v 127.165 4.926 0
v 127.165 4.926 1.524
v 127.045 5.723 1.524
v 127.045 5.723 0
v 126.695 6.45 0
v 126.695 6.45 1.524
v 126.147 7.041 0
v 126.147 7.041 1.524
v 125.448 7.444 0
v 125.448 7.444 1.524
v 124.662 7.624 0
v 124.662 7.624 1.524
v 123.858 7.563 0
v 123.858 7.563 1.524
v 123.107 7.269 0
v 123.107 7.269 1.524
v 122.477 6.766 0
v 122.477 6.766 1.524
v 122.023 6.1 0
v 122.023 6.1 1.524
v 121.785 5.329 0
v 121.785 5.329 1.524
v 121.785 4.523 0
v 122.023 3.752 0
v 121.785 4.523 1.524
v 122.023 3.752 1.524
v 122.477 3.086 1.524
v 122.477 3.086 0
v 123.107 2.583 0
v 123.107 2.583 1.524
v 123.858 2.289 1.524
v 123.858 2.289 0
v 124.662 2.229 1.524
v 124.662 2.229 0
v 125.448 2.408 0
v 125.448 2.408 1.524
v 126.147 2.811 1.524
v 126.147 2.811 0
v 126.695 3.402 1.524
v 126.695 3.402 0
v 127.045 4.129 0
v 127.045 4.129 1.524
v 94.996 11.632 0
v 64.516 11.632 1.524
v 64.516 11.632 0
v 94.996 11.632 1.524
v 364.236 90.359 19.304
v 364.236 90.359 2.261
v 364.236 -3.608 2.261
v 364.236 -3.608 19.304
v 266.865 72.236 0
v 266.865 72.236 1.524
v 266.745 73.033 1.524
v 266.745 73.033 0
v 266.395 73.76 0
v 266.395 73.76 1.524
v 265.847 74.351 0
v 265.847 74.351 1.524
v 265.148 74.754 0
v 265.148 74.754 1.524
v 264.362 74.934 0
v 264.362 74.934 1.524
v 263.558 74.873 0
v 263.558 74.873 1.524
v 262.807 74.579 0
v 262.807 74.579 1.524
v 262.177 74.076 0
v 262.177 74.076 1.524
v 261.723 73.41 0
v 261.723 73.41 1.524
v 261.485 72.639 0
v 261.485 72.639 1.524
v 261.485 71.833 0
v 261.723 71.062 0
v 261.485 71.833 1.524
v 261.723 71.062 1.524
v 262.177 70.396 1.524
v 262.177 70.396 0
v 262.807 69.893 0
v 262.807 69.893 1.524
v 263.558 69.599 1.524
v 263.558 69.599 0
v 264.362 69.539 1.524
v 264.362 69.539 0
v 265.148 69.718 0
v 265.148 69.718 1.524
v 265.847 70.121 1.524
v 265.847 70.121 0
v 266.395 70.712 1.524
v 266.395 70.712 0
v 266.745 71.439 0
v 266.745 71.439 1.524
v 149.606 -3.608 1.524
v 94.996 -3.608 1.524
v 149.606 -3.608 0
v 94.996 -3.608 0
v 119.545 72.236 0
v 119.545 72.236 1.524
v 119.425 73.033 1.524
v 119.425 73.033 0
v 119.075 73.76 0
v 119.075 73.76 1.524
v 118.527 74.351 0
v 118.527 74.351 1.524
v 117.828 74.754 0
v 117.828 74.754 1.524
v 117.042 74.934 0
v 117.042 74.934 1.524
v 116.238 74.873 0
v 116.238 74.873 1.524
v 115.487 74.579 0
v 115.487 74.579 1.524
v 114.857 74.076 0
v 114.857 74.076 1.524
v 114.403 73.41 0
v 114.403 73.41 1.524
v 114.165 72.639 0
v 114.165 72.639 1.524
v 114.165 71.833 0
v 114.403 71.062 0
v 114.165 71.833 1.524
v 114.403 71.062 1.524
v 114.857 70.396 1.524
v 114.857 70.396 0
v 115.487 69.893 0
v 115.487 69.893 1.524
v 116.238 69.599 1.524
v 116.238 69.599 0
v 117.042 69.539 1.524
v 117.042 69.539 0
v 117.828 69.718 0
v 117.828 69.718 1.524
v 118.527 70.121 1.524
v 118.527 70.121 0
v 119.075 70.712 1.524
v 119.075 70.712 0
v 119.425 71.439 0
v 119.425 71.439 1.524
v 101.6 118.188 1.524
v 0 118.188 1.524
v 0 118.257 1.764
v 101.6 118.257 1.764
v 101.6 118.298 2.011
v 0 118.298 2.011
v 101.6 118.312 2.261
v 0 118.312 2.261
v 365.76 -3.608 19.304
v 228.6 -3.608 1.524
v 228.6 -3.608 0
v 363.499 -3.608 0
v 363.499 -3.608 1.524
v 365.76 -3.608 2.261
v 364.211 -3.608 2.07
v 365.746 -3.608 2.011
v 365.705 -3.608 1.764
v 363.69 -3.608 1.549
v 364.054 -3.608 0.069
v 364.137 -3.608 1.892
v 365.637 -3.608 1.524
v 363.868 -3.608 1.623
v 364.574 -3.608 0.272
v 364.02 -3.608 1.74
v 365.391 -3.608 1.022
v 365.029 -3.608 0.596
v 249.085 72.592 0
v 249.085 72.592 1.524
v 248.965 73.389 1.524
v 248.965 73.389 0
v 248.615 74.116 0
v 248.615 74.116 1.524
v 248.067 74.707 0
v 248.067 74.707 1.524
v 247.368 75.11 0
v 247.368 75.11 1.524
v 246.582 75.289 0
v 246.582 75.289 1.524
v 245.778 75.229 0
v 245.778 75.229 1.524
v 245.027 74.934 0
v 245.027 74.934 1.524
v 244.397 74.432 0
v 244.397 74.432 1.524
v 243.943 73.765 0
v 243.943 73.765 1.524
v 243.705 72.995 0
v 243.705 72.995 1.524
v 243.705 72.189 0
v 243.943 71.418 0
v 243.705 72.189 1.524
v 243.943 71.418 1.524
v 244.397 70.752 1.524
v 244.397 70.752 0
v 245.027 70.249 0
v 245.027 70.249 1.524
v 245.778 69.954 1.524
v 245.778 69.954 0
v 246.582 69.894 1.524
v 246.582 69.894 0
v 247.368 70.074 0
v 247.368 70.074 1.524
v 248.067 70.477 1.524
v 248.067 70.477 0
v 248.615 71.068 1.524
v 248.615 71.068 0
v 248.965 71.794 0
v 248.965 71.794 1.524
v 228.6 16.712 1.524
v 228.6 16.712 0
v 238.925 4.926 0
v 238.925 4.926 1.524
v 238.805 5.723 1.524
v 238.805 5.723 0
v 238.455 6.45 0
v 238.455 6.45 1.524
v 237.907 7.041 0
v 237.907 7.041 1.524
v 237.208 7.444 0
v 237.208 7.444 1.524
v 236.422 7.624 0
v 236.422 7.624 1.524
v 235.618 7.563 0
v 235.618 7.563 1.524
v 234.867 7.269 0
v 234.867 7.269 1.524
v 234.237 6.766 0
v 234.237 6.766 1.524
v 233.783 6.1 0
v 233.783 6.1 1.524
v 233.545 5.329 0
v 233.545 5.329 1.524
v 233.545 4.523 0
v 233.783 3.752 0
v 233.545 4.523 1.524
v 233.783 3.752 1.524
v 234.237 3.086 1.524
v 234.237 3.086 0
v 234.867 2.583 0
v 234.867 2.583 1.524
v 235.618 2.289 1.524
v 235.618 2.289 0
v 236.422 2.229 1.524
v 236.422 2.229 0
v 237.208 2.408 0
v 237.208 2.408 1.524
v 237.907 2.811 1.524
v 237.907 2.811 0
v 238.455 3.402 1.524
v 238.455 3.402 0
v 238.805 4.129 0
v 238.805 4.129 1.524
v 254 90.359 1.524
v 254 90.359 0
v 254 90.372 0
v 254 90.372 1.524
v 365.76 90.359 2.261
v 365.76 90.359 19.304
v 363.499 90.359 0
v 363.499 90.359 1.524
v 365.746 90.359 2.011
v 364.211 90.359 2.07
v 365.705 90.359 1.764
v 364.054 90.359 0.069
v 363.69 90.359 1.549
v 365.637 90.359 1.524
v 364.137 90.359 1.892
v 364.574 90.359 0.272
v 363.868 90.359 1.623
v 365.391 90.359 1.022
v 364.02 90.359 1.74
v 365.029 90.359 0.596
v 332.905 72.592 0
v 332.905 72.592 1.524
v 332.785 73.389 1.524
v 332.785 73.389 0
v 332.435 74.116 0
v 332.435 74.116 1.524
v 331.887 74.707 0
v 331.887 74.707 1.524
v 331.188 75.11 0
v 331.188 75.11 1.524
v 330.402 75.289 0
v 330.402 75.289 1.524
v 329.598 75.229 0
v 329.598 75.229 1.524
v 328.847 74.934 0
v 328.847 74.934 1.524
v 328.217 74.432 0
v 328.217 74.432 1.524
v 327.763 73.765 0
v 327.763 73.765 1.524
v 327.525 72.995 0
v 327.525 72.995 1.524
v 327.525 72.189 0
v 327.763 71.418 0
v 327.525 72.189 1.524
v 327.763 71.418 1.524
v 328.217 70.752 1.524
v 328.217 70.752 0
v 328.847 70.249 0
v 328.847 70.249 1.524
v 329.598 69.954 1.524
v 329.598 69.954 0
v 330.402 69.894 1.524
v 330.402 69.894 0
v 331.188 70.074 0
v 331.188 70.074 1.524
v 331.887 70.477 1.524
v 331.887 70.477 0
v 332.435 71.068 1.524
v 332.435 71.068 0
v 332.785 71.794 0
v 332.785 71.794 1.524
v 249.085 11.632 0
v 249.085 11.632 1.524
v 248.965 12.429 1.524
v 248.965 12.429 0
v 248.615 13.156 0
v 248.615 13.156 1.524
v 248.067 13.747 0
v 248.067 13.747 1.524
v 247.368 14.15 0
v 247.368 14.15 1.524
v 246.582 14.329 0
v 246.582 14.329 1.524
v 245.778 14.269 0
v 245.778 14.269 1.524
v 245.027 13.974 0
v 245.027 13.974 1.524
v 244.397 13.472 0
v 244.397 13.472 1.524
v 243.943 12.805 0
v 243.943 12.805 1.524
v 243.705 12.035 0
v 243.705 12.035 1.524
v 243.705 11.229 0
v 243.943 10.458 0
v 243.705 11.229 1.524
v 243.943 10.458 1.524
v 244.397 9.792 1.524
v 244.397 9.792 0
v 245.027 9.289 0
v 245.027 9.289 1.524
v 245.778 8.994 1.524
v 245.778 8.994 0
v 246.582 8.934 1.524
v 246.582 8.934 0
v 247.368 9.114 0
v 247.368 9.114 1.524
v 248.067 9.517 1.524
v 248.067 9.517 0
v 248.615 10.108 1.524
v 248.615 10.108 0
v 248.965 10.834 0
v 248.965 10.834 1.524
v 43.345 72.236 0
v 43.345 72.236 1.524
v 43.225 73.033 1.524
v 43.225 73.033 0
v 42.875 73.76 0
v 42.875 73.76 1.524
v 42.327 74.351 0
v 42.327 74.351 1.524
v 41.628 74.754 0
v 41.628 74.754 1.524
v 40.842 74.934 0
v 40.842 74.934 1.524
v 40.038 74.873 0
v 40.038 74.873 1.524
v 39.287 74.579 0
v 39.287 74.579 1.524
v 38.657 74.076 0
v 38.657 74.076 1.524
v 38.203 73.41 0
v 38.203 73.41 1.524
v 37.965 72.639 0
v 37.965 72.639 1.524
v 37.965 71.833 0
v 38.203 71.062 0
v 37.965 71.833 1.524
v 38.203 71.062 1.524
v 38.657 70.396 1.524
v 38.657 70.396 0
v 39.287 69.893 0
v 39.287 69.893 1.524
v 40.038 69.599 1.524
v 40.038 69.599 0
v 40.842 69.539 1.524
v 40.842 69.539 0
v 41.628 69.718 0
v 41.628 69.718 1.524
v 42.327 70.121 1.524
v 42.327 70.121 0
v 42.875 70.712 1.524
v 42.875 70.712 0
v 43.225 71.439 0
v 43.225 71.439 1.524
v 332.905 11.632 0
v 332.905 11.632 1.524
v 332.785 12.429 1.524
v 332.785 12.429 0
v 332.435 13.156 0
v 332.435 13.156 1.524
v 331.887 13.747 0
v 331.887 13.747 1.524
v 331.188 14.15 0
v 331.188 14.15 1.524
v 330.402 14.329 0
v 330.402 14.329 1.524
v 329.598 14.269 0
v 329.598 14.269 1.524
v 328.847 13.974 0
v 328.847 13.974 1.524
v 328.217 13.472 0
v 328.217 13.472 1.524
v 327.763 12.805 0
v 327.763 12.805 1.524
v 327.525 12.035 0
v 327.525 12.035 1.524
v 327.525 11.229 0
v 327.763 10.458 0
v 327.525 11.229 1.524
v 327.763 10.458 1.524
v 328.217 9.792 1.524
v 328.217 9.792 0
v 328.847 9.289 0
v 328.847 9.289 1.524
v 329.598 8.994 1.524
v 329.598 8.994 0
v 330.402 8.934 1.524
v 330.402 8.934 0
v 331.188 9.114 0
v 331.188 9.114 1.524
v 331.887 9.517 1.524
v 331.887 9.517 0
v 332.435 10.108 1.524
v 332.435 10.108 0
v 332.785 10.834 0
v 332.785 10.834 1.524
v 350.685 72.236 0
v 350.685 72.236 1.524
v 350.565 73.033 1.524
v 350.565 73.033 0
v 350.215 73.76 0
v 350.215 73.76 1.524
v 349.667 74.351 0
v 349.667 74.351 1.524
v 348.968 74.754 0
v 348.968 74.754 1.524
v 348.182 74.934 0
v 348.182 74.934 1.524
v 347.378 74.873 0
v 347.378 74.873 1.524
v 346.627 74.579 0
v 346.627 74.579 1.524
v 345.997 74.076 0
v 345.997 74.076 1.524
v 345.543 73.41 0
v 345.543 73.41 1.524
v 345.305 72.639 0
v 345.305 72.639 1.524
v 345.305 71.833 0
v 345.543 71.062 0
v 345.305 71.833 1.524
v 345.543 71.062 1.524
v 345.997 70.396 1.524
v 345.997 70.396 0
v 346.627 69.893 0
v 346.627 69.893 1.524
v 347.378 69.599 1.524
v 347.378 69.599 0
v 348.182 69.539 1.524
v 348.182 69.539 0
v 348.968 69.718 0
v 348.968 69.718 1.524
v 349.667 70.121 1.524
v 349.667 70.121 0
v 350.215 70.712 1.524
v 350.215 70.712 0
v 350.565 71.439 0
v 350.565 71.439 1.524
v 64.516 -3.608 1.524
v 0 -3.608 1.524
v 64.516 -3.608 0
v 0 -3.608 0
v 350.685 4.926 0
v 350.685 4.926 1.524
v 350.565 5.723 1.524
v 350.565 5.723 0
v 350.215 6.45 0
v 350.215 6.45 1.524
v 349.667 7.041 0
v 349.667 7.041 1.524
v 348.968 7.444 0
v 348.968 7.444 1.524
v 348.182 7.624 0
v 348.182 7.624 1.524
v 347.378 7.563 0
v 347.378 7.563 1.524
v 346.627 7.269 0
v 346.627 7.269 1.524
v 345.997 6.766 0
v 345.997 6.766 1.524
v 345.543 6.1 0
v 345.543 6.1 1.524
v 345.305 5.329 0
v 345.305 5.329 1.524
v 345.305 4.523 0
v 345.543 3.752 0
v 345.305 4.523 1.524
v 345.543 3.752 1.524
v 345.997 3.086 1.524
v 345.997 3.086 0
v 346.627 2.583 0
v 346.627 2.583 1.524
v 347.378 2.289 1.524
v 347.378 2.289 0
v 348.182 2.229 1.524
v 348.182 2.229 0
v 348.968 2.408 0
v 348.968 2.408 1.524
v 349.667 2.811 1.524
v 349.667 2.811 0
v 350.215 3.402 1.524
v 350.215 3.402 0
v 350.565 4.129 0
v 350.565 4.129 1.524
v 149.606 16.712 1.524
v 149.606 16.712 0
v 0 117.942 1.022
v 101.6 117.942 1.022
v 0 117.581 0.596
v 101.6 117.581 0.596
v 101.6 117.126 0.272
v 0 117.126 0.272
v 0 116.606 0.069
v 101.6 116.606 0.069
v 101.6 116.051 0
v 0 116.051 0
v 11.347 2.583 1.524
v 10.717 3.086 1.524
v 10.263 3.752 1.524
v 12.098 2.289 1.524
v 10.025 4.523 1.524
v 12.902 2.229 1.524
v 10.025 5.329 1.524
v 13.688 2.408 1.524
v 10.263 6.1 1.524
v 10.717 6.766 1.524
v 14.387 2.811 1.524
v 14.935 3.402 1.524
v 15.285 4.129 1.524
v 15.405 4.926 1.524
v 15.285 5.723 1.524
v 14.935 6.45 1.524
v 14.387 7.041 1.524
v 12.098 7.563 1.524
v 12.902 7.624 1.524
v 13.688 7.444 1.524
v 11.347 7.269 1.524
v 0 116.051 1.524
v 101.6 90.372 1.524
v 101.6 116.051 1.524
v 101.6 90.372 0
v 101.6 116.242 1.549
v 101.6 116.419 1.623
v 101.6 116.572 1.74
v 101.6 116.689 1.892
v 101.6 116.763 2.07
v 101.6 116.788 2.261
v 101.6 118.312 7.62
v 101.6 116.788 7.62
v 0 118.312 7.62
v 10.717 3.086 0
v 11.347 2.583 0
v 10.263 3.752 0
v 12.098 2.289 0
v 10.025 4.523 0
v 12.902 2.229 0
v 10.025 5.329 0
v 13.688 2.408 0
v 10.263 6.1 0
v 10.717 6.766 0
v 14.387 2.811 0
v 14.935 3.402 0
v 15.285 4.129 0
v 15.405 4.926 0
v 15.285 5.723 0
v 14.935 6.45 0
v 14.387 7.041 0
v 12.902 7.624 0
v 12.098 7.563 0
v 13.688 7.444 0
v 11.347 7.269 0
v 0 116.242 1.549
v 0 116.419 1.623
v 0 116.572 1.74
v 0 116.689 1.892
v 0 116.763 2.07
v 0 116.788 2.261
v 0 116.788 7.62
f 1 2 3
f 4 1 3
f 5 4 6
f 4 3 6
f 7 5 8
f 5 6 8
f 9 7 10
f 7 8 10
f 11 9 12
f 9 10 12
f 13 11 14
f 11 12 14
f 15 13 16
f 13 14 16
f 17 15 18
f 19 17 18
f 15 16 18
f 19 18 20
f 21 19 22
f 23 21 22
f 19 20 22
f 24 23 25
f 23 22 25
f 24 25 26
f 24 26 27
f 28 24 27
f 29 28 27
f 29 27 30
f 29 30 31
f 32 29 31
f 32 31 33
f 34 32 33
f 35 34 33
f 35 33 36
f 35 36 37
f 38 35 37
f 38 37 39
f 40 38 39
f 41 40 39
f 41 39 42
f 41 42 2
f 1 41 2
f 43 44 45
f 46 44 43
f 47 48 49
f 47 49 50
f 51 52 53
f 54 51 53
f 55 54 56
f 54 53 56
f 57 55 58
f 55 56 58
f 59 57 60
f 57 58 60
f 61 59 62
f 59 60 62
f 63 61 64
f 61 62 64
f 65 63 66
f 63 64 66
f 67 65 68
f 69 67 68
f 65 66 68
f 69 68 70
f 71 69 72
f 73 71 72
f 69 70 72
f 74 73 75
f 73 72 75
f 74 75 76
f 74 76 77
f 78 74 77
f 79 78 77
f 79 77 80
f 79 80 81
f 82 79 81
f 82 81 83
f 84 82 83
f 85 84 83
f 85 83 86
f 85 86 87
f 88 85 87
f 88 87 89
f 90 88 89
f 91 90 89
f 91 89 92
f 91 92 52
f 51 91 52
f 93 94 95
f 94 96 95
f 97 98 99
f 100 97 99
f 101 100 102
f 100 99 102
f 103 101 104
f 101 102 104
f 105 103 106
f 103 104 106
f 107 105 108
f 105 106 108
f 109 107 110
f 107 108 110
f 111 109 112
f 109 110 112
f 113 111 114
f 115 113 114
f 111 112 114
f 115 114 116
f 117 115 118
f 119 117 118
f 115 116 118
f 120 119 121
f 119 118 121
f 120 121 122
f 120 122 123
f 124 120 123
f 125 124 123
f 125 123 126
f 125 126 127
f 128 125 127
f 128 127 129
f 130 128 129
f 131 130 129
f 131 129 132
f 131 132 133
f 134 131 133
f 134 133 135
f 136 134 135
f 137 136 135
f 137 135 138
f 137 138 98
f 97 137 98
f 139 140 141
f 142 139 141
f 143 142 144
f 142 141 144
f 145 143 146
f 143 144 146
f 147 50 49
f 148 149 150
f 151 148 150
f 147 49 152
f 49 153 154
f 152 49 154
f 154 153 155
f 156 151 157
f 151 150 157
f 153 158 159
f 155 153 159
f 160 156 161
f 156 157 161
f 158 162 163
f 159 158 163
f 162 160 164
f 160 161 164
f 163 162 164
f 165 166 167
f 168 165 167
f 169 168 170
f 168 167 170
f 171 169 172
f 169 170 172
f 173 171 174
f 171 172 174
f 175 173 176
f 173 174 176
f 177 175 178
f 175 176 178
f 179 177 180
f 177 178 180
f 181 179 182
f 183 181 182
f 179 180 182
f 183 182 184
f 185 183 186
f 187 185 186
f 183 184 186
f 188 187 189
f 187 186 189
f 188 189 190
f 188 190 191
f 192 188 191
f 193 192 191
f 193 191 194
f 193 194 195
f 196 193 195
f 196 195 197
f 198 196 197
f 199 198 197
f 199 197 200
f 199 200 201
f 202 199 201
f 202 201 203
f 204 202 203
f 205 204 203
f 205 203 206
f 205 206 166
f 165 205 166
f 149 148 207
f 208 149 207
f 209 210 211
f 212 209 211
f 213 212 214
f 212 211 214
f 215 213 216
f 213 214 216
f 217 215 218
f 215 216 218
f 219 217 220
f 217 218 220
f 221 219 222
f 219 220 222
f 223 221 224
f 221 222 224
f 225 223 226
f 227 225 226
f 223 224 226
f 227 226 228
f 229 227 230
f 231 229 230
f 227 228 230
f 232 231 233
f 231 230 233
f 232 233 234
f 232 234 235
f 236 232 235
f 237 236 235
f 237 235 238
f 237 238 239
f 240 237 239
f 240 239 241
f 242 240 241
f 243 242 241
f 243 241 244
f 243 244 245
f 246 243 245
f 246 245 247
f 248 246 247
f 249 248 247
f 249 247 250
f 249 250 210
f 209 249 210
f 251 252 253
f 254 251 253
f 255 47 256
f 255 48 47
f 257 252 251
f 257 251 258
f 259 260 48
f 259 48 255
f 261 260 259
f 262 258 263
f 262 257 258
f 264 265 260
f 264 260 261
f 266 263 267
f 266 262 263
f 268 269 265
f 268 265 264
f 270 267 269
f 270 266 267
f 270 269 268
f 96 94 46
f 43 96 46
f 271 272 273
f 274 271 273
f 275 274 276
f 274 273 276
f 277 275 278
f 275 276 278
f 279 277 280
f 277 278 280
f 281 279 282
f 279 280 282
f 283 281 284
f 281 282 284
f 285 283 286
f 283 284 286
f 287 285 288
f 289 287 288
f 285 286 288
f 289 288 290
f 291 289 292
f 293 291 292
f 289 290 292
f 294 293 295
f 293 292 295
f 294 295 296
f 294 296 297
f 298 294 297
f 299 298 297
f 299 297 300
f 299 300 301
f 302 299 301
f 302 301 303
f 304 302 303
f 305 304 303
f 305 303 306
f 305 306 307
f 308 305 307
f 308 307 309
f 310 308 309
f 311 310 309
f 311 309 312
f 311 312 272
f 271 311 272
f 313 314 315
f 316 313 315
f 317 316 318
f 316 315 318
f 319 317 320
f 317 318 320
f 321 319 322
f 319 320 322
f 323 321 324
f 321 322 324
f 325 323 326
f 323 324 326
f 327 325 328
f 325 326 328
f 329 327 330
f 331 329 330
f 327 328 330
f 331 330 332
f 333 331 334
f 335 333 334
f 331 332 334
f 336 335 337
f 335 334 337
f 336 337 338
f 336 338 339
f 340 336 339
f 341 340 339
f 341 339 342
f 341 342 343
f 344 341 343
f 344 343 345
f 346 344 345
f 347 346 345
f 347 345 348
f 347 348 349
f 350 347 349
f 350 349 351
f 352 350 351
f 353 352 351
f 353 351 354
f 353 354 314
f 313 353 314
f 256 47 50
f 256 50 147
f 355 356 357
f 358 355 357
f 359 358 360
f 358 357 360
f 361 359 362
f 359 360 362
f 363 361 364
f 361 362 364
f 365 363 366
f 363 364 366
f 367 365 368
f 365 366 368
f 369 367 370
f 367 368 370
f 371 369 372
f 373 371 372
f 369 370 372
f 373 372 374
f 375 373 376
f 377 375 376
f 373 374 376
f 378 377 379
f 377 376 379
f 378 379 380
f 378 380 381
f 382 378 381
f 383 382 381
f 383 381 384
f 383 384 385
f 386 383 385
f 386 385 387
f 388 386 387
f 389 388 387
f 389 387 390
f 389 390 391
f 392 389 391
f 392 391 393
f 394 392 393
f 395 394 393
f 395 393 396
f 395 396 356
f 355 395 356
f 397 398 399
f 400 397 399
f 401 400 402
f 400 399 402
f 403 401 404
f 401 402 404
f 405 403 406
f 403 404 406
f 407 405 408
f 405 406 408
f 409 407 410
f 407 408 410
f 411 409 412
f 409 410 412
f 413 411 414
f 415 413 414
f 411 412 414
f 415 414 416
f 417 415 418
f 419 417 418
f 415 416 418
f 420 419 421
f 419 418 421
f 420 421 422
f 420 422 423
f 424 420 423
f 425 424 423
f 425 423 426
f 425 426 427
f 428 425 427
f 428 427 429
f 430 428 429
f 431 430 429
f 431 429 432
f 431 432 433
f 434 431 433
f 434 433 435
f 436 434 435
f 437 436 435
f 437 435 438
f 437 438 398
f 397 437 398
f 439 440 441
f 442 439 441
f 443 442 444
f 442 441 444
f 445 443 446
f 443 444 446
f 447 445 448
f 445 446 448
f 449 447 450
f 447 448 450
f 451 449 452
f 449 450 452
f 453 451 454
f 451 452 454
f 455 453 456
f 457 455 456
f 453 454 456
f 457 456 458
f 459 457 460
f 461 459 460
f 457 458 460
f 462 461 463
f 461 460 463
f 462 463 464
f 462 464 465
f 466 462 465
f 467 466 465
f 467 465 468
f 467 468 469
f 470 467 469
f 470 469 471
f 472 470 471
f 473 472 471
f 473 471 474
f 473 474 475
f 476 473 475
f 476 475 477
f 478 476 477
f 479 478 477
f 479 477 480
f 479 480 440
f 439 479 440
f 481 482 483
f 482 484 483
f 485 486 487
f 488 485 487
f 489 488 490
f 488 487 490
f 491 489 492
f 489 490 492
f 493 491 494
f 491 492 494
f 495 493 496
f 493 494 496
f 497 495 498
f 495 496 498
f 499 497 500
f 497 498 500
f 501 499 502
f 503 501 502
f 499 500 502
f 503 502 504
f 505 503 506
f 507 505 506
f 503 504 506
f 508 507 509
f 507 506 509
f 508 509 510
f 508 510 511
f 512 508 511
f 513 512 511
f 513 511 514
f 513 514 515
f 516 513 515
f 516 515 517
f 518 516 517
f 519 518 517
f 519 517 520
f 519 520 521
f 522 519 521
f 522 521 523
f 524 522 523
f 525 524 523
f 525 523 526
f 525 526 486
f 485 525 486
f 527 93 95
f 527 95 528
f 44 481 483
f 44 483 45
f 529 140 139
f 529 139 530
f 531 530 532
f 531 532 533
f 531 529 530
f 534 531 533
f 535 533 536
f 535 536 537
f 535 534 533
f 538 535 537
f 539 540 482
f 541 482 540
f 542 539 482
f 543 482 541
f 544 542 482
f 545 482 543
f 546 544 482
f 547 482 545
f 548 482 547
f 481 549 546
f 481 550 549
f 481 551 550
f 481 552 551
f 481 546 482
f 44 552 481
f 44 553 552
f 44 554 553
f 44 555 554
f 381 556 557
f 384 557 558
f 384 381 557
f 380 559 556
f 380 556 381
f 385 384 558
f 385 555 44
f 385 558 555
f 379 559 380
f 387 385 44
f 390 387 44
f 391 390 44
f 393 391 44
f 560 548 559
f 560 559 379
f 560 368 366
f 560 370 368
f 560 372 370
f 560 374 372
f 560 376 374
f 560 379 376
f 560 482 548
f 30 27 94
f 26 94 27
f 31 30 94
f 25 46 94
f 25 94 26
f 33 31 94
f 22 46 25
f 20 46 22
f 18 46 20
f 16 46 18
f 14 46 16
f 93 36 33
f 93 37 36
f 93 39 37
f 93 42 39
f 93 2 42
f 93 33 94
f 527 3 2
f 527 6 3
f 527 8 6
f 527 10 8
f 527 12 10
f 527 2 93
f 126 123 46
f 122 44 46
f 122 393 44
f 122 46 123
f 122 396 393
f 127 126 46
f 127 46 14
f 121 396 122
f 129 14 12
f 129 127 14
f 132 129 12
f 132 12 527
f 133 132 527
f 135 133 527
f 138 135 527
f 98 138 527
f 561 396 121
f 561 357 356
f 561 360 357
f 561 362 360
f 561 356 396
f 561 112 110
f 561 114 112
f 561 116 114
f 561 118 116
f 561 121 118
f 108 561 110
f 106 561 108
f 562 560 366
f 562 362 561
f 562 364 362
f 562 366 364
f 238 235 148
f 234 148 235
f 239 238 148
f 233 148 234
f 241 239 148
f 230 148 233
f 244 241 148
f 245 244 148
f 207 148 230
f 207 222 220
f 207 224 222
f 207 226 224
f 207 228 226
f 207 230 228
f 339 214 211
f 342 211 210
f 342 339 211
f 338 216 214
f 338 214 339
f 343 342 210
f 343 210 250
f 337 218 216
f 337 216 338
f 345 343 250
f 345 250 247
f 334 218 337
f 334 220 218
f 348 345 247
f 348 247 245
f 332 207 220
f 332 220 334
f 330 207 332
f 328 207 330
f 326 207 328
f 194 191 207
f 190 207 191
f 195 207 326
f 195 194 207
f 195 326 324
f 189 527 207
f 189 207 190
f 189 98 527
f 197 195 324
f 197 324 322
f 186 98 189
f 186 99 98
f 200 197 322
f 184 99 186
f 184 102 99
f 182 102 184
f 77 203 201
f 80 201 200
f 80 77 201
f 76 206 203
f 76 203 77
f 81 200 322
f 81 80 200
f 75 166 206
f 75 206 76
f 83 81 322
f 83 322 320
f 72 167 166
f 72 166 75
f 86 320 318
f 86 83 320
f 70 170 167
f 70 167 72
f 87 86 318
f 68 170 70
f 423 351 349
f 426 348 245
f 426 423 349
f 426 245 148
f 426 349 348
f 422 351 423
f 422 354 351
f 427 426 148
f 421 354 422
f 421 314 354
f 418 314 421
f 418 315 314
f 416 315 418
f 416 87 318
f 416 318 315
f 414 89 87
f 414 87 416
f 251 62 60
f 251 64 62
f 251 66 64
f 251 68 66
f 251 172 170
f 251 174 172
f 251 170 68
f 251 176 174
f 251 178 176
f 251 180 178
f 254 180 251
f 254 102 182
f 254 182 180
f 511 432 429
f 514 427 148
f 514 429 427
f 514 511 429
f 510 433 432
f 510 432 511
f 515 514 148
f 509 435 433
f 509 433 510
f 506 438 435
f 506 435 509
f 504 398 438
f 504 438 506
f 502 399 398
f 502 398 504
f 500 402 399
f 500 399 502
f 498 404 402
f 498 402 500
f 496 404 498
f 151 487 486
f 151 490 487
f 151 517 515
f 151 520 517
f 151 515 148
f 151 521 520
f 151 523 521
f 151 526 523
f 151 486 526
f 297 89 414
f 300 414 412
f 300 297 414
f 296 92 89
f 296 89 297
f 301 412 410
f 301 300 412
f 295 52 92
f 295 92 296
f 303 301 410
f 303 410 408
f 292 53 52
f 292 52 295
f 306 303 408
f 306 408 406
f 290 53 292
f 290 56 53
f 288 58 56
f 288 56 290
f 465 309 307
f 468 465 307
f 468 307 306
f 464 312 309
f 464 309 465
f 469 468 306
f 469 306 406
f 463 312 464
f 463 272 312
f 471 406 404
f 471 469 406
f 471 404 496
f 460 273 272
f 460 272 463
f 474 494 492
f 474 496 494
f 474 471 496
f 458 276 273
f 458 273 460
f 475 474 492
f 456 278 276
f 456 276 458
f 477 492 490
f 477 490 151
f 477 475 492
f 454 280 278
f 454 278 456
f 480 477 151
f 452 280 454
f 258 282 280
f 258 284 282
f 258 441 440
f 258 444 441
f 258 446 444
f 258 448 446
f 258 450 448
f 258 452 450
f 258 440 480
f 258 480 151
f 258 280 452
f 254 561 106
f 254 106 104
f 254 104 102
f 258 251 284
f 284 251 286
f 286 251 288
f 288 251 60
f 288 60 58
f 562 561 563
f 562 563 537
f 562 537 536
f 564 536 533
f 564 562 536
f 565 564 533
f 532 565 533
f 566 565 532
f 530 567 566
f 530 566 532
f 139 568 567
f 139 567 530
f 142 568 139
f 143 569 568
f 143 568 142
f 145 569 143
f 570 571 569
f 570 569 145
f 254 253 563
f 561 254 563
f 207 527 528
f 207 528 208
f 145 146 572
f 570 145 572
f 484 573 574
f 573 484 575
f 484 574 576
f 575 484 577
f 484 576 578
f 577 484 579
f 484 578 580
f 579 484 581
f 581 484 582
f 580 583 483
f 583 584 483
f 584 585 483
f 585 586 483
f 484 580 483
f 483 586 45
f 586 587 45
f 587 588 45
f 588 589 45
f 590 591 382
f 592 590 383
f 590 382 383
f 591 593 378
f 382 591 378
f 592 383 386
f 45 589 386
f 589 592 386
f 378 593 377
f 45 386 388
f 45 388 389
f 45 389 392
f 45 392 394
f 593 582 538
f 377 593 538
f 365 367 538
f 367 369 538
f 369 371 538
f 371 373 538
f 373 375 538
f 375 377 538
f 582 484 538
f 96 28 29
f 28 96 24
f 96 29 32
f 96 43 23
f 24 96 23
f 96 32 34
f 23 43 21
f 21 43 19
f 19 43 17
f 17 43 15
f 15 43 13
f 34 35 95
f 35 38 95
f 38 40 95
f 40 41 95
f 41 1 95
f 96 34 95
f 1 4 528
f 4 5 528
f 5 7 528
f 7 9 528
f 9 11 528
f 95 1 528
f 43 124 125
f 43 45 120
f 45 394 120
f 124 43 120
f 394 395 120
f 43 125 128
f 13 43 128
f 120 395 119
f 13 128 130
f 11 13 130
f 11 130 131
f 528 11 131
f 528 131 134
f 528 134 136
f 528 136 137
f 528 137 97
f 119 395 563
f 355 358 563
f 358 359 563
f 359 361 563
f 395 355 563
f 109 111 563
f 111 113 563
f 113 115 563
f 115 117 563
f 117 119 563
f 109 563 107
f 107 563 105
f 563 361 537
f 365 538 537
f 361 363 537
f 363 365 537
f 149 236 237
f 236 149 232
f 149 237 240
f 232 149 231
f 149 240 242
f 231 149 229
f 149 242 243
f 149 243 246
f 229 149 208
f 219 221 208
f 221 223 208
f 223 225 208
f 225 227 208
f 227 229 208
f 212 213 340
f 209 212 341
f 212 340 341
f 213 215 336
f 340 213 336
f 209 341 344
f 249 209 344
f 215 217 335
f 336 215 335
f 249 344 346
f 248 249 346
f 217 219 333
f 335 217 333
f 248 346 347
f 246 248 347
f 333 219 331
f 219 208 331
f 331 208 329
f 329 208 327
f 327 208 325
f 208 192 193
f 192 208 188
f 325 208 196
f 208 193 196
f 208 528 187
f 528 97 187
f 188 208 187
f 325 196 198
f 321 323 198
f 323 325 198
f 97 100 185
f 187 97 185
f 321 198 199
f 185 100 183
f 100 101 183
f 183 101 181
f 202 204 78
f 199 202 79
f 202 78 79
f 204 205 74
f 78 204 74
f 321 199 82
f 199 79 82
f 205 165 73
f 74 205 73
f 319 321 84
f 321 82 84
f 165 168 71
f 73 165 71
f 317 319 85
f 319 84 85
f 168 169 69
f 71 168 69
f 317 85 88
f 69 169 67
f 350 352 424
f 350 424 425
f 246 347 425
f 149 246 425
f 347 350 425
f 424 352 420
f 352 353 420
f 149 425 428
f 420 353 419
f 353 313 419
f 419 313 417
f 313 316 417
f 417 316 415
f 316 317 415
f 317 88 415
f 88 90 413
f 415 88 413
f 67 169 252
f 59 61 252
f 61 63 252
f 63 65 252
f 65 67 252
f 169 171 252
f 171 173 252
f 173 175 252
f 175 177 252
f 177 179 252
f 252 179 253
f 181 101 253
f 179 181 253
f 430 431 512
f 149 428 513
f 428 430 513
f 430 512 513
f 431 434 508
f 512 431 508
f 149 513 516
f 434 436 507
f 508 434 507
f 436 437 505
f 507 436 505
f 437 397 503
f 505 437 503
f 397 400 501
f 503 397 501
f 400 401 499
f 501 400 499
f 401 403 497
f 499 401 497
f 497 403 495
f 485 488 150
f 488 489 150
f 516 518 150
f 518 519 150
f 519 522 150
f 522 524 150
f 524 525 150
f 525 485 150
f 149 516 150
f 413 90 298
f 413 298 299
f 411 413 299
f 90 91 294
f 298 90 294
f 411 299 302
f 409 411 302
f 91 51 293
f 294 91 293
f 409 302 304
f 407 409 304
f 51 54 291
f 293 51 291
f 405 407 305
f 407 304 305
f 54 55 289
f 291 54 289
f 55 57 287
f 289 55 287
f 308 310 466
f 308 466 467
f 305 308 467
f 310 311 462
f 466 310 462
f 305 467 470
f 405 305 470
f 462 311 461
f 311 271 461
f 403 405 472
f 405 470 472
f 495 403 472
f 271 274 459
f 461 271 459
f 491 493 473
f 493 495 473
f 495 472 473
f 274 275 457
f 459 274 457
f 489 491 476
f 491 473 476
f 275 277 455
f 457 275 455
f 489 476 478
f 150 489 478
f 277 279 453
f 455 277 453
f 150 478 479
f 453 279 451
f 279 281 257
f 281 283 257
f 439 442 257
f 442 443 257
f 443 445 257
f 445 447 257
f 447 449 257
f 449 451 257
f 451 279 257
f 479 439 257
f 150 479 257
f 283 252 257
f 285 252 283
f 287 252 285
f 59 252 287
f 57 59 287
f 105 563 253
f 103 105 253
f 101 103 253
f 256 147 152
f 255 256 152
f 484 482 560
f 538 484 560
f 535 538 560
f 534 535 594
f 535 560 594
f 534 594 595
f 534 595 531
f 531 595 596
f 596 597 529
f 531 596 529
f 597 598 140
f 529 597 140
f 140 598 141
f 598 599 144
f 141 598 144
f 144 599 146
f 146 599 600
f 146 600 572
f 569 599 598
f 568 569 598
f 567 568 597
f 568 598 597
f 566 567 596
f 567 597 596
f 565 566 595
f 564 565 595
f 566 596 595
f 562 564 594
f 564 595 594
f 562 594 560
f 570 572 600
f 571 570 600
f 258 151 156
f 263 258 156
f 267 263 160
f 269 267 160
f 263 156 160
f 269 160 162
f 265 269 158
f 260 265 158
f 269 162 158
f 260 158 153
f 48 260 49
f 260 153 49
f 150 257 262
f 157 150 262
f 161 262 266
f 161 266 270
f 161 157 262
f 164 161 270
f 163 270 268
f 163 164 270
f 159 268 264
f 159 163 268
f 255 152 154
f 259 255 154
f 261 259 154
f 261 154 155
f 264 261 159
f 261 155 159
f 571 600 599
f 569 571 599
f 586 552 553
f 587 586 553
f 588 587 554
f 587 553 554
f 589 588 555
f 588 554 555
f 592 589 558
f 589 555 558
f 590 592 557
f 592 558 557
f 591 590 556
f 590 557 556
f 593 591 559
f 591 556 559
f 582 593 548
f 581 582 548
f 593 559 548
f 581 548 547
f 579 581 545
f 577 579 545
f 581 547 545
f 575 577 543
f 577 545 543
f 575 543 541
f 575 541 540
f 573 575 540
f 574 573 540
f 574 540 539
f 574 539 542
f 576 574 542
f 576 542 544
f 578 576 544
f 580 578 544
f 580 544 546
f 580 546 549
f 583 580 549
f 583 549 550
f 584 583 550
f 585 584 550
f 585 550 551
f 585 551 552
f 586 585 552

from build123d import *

# Parameters (mm, degrees)
BASE_FLANGE1_DEPTH    = 1.524
MITER_START           = -3.608291964
MITER_FLANGE1_DEPTH   = 93.967487941
MITER_FLANGE1_2_DEPTH = 93.967487941
MITER_FLANGE2_DEPTH   = 101.6
MITER_FLANGE2_2_DEPTH = 101.6
SKETCH6_R             = 2.7051
PCB_MOUNT_HOLES_DEPTH = 2.54
SKETCH7_W             = 78.994
SKETCH7_H             = 20.32
SKETCH7_W_2           = 30.48
SKETCH7_H_2           = 15.24
CUT_EXTRUDE2_DEPTH    = 2.54
SKETCH8_R             = 2.7051
CUT_EXTRUDE3_DEPTH    = 2.54
LPATTERN1_COUNT       = 2
LPATTERN1_PITCH       = 83.82
LPATTERN1_COUNT_DIR2  = 2
LPATTERN1_PITCH_DIR2  = 60.96


# Read off the part's stored shape, not the designer's step: Miter Flange1, Miter Flange2
# Sheet-metal steps are written as plain solids
with BuildPart() as part:
    # Sketch1 → Base-Flange1 (new body)
    with BuildSketch(Plane.XY):
        Polygon((0, 0), (0, -3.608291964), (365.76, -3.608291964), (365.76, 90.359195977), (254, 90.359195977), (254, 90.371708036), (101.6, 90.371708036), (101.6, 118.311708036), (0, 118.311708036), align=None)
    extrude(amount=BASE_FLANGE1_DEPTH)

    # Miter Flange1 outline → Miter Flange1 (cut)
    with BuildSketch(Plane(origin=(0, 0, 0), x_dir=(1, 0, 0), z_dir=(0, 1, 0)).offset(MITER_START)):
        with BuildLine():
            ThreePointArc((363.4994, 0), (364.811869886, -0.420019885), (365.636625492, -1.524))
            Line((365.636625492, -1.524), (365.76, -1.524))
            Line((365.76, -1.524), (365.76, 0))
            Line((365.76, 0), (363.4994, 0))
        make_face()
    extrude(amount=MITER_FLANGE1_DEPTH, mode=Mode.SUBTRACT)

    # Miter Flange1 2 outline → Miter Flange1 2 (add)
    with BuildSketch(Plane(origin=(0, 0, 0), x_dir=(1, 0, 0), z_dir=(0, 1, 0)).offset(MITER_START)):
        with BuildLine():
            Line((364.236, -19.304), (365.76, -19.304))
            Line((365.76, -19.304), (365.76, -2.2606))
            ThreePointArc((365.76, -2.2606), (365.728943037, -1.887169675), (365.636625492, -1.524))
            Line((365.636625492, -1.524), (363.4994, -1.524))
            ThreePointArc((363.4994, -1.524), (364.020254855, -1.739745145), (364.236, -2.2606))
            Line((364.236, -2.2606), (364.236, -19.304))
        make_face()
    extrude(amount=MITER_FLANGE1_2_DEPTH)

    # Miter Flange2 outline → Miter Flange2 (cut)
    with BuildSketch(Plane.YZ):
        with BuildLine():
            Line((118.311708036, 1.524), (118.188333528, 1.524))
            ThreePointArc((118.188333528, 1.524), (117.363577922, 0.420019885), (116.051108036, 0))
            Line((116.051108036, 0), (118.311708036, 0))
            Line((118.311708036, 0), (118.311708036, 1.524))
        make_face()
    extrude(amount=MITER_FLANGE2_DEPTH, mode=Mode.SUBTRACT)

    # Miter Flange2 2 outline → Miter Flange2 2 (add)
    with BuildSketch(Plane.YZ):
        with BuildLine():
            Line((118.311708036, 7.62), (116.787708036, 7.62))
            Line((116.787708036, 7.62), (116.787708036, 2.2606))
            ThreePointArc((116.787708036, 2.2606), (116.571962891, 1.739745145), (116.051108036, 1.524))
            Line((116.051108036, 1.524), (118.188333528, 1.524))
            ThreePointArc((118.188333528, 1.524), (118.280651073, 1.887169675), (118.311708036, 2.2606))
            Line((118.311708036, 2.2606), (118.311708036, 7.62))
        make_face()
    extrude(amount=MITER_FLANGE2_2_DEPTH)

    # Sketch6 → PCB mount holes (cut)
    with BuildSketch(Plane.XY.offset(1.524)):
        with Locations((347.98, 4.926108036)):
            Circle(SKETCH6_R)
        with Locations((347.98, 72.236108036)):
            Circle(SKETCH6_R)
        with Locations((264.16, 72.236108036)):
            Circle(SKETCH6_R)
        with Locations((236.22, 4.926108036)):
            Circle(SKETCH6_R)
        with Locations((12.7, 4.926108036)):
            Circle(SKETCH6_R)
        with Locations((40.64, 72.236108036)):
            Circle(SKETCH6_R)
        with Locations((116.84, 72.236108036)):
            Circle(SKETCH6_R)
        with Locations((124.46, 4.926108036)):
            Circle(SKETCH6_R)
    extrude(amount=-PCB_MOUNT_HOLES_DEPTH, mode=Mode.SUBTRACT)

    # Sketch7 → Cut-Extrude2 (cut)
    with BuildSketch(Plane.XY.offset(1.524)):
        with Locations((189.103, 6.551708036)):
            Rectangle(SKETCH7_W, SKETCH7_H)
        with Locations((79.756, 4.011708036)):
            Rectangle(SKETCH7_W_2, SKETCH7_H_2)
    extrude(amount=-CUT_EXTRUDE2_DEPTH, mode=Mode.SUBTRACT)

    # Sketch8 → Cut-Extrude3 (cut)
    with BuildSketch(Plane.XY.offset(1.524)):
        with Locations((330.2, 11.631708036)):
            Circle(SKETCH8_R)
    cut_extrude3 = extrude(amount=-CUT_EXTRUDE3_DEPTH, mode=Mode.SUBTRACT)

    # LPattern1: Cut-Extrude3 2 × 2
    with Locations(*[(-i * LPATTERN1_PITCH, j * LPATTERN1_PITCH_DIR2, 0) for i in range(LPATTERN1_COUNT) for j in range(LPATTERN1_COUNT_DIR2) if (i, j) != (0, 0)]):
        add(cut_extrude3, mode=Mode.SUBTRACT)


solid = part.part
